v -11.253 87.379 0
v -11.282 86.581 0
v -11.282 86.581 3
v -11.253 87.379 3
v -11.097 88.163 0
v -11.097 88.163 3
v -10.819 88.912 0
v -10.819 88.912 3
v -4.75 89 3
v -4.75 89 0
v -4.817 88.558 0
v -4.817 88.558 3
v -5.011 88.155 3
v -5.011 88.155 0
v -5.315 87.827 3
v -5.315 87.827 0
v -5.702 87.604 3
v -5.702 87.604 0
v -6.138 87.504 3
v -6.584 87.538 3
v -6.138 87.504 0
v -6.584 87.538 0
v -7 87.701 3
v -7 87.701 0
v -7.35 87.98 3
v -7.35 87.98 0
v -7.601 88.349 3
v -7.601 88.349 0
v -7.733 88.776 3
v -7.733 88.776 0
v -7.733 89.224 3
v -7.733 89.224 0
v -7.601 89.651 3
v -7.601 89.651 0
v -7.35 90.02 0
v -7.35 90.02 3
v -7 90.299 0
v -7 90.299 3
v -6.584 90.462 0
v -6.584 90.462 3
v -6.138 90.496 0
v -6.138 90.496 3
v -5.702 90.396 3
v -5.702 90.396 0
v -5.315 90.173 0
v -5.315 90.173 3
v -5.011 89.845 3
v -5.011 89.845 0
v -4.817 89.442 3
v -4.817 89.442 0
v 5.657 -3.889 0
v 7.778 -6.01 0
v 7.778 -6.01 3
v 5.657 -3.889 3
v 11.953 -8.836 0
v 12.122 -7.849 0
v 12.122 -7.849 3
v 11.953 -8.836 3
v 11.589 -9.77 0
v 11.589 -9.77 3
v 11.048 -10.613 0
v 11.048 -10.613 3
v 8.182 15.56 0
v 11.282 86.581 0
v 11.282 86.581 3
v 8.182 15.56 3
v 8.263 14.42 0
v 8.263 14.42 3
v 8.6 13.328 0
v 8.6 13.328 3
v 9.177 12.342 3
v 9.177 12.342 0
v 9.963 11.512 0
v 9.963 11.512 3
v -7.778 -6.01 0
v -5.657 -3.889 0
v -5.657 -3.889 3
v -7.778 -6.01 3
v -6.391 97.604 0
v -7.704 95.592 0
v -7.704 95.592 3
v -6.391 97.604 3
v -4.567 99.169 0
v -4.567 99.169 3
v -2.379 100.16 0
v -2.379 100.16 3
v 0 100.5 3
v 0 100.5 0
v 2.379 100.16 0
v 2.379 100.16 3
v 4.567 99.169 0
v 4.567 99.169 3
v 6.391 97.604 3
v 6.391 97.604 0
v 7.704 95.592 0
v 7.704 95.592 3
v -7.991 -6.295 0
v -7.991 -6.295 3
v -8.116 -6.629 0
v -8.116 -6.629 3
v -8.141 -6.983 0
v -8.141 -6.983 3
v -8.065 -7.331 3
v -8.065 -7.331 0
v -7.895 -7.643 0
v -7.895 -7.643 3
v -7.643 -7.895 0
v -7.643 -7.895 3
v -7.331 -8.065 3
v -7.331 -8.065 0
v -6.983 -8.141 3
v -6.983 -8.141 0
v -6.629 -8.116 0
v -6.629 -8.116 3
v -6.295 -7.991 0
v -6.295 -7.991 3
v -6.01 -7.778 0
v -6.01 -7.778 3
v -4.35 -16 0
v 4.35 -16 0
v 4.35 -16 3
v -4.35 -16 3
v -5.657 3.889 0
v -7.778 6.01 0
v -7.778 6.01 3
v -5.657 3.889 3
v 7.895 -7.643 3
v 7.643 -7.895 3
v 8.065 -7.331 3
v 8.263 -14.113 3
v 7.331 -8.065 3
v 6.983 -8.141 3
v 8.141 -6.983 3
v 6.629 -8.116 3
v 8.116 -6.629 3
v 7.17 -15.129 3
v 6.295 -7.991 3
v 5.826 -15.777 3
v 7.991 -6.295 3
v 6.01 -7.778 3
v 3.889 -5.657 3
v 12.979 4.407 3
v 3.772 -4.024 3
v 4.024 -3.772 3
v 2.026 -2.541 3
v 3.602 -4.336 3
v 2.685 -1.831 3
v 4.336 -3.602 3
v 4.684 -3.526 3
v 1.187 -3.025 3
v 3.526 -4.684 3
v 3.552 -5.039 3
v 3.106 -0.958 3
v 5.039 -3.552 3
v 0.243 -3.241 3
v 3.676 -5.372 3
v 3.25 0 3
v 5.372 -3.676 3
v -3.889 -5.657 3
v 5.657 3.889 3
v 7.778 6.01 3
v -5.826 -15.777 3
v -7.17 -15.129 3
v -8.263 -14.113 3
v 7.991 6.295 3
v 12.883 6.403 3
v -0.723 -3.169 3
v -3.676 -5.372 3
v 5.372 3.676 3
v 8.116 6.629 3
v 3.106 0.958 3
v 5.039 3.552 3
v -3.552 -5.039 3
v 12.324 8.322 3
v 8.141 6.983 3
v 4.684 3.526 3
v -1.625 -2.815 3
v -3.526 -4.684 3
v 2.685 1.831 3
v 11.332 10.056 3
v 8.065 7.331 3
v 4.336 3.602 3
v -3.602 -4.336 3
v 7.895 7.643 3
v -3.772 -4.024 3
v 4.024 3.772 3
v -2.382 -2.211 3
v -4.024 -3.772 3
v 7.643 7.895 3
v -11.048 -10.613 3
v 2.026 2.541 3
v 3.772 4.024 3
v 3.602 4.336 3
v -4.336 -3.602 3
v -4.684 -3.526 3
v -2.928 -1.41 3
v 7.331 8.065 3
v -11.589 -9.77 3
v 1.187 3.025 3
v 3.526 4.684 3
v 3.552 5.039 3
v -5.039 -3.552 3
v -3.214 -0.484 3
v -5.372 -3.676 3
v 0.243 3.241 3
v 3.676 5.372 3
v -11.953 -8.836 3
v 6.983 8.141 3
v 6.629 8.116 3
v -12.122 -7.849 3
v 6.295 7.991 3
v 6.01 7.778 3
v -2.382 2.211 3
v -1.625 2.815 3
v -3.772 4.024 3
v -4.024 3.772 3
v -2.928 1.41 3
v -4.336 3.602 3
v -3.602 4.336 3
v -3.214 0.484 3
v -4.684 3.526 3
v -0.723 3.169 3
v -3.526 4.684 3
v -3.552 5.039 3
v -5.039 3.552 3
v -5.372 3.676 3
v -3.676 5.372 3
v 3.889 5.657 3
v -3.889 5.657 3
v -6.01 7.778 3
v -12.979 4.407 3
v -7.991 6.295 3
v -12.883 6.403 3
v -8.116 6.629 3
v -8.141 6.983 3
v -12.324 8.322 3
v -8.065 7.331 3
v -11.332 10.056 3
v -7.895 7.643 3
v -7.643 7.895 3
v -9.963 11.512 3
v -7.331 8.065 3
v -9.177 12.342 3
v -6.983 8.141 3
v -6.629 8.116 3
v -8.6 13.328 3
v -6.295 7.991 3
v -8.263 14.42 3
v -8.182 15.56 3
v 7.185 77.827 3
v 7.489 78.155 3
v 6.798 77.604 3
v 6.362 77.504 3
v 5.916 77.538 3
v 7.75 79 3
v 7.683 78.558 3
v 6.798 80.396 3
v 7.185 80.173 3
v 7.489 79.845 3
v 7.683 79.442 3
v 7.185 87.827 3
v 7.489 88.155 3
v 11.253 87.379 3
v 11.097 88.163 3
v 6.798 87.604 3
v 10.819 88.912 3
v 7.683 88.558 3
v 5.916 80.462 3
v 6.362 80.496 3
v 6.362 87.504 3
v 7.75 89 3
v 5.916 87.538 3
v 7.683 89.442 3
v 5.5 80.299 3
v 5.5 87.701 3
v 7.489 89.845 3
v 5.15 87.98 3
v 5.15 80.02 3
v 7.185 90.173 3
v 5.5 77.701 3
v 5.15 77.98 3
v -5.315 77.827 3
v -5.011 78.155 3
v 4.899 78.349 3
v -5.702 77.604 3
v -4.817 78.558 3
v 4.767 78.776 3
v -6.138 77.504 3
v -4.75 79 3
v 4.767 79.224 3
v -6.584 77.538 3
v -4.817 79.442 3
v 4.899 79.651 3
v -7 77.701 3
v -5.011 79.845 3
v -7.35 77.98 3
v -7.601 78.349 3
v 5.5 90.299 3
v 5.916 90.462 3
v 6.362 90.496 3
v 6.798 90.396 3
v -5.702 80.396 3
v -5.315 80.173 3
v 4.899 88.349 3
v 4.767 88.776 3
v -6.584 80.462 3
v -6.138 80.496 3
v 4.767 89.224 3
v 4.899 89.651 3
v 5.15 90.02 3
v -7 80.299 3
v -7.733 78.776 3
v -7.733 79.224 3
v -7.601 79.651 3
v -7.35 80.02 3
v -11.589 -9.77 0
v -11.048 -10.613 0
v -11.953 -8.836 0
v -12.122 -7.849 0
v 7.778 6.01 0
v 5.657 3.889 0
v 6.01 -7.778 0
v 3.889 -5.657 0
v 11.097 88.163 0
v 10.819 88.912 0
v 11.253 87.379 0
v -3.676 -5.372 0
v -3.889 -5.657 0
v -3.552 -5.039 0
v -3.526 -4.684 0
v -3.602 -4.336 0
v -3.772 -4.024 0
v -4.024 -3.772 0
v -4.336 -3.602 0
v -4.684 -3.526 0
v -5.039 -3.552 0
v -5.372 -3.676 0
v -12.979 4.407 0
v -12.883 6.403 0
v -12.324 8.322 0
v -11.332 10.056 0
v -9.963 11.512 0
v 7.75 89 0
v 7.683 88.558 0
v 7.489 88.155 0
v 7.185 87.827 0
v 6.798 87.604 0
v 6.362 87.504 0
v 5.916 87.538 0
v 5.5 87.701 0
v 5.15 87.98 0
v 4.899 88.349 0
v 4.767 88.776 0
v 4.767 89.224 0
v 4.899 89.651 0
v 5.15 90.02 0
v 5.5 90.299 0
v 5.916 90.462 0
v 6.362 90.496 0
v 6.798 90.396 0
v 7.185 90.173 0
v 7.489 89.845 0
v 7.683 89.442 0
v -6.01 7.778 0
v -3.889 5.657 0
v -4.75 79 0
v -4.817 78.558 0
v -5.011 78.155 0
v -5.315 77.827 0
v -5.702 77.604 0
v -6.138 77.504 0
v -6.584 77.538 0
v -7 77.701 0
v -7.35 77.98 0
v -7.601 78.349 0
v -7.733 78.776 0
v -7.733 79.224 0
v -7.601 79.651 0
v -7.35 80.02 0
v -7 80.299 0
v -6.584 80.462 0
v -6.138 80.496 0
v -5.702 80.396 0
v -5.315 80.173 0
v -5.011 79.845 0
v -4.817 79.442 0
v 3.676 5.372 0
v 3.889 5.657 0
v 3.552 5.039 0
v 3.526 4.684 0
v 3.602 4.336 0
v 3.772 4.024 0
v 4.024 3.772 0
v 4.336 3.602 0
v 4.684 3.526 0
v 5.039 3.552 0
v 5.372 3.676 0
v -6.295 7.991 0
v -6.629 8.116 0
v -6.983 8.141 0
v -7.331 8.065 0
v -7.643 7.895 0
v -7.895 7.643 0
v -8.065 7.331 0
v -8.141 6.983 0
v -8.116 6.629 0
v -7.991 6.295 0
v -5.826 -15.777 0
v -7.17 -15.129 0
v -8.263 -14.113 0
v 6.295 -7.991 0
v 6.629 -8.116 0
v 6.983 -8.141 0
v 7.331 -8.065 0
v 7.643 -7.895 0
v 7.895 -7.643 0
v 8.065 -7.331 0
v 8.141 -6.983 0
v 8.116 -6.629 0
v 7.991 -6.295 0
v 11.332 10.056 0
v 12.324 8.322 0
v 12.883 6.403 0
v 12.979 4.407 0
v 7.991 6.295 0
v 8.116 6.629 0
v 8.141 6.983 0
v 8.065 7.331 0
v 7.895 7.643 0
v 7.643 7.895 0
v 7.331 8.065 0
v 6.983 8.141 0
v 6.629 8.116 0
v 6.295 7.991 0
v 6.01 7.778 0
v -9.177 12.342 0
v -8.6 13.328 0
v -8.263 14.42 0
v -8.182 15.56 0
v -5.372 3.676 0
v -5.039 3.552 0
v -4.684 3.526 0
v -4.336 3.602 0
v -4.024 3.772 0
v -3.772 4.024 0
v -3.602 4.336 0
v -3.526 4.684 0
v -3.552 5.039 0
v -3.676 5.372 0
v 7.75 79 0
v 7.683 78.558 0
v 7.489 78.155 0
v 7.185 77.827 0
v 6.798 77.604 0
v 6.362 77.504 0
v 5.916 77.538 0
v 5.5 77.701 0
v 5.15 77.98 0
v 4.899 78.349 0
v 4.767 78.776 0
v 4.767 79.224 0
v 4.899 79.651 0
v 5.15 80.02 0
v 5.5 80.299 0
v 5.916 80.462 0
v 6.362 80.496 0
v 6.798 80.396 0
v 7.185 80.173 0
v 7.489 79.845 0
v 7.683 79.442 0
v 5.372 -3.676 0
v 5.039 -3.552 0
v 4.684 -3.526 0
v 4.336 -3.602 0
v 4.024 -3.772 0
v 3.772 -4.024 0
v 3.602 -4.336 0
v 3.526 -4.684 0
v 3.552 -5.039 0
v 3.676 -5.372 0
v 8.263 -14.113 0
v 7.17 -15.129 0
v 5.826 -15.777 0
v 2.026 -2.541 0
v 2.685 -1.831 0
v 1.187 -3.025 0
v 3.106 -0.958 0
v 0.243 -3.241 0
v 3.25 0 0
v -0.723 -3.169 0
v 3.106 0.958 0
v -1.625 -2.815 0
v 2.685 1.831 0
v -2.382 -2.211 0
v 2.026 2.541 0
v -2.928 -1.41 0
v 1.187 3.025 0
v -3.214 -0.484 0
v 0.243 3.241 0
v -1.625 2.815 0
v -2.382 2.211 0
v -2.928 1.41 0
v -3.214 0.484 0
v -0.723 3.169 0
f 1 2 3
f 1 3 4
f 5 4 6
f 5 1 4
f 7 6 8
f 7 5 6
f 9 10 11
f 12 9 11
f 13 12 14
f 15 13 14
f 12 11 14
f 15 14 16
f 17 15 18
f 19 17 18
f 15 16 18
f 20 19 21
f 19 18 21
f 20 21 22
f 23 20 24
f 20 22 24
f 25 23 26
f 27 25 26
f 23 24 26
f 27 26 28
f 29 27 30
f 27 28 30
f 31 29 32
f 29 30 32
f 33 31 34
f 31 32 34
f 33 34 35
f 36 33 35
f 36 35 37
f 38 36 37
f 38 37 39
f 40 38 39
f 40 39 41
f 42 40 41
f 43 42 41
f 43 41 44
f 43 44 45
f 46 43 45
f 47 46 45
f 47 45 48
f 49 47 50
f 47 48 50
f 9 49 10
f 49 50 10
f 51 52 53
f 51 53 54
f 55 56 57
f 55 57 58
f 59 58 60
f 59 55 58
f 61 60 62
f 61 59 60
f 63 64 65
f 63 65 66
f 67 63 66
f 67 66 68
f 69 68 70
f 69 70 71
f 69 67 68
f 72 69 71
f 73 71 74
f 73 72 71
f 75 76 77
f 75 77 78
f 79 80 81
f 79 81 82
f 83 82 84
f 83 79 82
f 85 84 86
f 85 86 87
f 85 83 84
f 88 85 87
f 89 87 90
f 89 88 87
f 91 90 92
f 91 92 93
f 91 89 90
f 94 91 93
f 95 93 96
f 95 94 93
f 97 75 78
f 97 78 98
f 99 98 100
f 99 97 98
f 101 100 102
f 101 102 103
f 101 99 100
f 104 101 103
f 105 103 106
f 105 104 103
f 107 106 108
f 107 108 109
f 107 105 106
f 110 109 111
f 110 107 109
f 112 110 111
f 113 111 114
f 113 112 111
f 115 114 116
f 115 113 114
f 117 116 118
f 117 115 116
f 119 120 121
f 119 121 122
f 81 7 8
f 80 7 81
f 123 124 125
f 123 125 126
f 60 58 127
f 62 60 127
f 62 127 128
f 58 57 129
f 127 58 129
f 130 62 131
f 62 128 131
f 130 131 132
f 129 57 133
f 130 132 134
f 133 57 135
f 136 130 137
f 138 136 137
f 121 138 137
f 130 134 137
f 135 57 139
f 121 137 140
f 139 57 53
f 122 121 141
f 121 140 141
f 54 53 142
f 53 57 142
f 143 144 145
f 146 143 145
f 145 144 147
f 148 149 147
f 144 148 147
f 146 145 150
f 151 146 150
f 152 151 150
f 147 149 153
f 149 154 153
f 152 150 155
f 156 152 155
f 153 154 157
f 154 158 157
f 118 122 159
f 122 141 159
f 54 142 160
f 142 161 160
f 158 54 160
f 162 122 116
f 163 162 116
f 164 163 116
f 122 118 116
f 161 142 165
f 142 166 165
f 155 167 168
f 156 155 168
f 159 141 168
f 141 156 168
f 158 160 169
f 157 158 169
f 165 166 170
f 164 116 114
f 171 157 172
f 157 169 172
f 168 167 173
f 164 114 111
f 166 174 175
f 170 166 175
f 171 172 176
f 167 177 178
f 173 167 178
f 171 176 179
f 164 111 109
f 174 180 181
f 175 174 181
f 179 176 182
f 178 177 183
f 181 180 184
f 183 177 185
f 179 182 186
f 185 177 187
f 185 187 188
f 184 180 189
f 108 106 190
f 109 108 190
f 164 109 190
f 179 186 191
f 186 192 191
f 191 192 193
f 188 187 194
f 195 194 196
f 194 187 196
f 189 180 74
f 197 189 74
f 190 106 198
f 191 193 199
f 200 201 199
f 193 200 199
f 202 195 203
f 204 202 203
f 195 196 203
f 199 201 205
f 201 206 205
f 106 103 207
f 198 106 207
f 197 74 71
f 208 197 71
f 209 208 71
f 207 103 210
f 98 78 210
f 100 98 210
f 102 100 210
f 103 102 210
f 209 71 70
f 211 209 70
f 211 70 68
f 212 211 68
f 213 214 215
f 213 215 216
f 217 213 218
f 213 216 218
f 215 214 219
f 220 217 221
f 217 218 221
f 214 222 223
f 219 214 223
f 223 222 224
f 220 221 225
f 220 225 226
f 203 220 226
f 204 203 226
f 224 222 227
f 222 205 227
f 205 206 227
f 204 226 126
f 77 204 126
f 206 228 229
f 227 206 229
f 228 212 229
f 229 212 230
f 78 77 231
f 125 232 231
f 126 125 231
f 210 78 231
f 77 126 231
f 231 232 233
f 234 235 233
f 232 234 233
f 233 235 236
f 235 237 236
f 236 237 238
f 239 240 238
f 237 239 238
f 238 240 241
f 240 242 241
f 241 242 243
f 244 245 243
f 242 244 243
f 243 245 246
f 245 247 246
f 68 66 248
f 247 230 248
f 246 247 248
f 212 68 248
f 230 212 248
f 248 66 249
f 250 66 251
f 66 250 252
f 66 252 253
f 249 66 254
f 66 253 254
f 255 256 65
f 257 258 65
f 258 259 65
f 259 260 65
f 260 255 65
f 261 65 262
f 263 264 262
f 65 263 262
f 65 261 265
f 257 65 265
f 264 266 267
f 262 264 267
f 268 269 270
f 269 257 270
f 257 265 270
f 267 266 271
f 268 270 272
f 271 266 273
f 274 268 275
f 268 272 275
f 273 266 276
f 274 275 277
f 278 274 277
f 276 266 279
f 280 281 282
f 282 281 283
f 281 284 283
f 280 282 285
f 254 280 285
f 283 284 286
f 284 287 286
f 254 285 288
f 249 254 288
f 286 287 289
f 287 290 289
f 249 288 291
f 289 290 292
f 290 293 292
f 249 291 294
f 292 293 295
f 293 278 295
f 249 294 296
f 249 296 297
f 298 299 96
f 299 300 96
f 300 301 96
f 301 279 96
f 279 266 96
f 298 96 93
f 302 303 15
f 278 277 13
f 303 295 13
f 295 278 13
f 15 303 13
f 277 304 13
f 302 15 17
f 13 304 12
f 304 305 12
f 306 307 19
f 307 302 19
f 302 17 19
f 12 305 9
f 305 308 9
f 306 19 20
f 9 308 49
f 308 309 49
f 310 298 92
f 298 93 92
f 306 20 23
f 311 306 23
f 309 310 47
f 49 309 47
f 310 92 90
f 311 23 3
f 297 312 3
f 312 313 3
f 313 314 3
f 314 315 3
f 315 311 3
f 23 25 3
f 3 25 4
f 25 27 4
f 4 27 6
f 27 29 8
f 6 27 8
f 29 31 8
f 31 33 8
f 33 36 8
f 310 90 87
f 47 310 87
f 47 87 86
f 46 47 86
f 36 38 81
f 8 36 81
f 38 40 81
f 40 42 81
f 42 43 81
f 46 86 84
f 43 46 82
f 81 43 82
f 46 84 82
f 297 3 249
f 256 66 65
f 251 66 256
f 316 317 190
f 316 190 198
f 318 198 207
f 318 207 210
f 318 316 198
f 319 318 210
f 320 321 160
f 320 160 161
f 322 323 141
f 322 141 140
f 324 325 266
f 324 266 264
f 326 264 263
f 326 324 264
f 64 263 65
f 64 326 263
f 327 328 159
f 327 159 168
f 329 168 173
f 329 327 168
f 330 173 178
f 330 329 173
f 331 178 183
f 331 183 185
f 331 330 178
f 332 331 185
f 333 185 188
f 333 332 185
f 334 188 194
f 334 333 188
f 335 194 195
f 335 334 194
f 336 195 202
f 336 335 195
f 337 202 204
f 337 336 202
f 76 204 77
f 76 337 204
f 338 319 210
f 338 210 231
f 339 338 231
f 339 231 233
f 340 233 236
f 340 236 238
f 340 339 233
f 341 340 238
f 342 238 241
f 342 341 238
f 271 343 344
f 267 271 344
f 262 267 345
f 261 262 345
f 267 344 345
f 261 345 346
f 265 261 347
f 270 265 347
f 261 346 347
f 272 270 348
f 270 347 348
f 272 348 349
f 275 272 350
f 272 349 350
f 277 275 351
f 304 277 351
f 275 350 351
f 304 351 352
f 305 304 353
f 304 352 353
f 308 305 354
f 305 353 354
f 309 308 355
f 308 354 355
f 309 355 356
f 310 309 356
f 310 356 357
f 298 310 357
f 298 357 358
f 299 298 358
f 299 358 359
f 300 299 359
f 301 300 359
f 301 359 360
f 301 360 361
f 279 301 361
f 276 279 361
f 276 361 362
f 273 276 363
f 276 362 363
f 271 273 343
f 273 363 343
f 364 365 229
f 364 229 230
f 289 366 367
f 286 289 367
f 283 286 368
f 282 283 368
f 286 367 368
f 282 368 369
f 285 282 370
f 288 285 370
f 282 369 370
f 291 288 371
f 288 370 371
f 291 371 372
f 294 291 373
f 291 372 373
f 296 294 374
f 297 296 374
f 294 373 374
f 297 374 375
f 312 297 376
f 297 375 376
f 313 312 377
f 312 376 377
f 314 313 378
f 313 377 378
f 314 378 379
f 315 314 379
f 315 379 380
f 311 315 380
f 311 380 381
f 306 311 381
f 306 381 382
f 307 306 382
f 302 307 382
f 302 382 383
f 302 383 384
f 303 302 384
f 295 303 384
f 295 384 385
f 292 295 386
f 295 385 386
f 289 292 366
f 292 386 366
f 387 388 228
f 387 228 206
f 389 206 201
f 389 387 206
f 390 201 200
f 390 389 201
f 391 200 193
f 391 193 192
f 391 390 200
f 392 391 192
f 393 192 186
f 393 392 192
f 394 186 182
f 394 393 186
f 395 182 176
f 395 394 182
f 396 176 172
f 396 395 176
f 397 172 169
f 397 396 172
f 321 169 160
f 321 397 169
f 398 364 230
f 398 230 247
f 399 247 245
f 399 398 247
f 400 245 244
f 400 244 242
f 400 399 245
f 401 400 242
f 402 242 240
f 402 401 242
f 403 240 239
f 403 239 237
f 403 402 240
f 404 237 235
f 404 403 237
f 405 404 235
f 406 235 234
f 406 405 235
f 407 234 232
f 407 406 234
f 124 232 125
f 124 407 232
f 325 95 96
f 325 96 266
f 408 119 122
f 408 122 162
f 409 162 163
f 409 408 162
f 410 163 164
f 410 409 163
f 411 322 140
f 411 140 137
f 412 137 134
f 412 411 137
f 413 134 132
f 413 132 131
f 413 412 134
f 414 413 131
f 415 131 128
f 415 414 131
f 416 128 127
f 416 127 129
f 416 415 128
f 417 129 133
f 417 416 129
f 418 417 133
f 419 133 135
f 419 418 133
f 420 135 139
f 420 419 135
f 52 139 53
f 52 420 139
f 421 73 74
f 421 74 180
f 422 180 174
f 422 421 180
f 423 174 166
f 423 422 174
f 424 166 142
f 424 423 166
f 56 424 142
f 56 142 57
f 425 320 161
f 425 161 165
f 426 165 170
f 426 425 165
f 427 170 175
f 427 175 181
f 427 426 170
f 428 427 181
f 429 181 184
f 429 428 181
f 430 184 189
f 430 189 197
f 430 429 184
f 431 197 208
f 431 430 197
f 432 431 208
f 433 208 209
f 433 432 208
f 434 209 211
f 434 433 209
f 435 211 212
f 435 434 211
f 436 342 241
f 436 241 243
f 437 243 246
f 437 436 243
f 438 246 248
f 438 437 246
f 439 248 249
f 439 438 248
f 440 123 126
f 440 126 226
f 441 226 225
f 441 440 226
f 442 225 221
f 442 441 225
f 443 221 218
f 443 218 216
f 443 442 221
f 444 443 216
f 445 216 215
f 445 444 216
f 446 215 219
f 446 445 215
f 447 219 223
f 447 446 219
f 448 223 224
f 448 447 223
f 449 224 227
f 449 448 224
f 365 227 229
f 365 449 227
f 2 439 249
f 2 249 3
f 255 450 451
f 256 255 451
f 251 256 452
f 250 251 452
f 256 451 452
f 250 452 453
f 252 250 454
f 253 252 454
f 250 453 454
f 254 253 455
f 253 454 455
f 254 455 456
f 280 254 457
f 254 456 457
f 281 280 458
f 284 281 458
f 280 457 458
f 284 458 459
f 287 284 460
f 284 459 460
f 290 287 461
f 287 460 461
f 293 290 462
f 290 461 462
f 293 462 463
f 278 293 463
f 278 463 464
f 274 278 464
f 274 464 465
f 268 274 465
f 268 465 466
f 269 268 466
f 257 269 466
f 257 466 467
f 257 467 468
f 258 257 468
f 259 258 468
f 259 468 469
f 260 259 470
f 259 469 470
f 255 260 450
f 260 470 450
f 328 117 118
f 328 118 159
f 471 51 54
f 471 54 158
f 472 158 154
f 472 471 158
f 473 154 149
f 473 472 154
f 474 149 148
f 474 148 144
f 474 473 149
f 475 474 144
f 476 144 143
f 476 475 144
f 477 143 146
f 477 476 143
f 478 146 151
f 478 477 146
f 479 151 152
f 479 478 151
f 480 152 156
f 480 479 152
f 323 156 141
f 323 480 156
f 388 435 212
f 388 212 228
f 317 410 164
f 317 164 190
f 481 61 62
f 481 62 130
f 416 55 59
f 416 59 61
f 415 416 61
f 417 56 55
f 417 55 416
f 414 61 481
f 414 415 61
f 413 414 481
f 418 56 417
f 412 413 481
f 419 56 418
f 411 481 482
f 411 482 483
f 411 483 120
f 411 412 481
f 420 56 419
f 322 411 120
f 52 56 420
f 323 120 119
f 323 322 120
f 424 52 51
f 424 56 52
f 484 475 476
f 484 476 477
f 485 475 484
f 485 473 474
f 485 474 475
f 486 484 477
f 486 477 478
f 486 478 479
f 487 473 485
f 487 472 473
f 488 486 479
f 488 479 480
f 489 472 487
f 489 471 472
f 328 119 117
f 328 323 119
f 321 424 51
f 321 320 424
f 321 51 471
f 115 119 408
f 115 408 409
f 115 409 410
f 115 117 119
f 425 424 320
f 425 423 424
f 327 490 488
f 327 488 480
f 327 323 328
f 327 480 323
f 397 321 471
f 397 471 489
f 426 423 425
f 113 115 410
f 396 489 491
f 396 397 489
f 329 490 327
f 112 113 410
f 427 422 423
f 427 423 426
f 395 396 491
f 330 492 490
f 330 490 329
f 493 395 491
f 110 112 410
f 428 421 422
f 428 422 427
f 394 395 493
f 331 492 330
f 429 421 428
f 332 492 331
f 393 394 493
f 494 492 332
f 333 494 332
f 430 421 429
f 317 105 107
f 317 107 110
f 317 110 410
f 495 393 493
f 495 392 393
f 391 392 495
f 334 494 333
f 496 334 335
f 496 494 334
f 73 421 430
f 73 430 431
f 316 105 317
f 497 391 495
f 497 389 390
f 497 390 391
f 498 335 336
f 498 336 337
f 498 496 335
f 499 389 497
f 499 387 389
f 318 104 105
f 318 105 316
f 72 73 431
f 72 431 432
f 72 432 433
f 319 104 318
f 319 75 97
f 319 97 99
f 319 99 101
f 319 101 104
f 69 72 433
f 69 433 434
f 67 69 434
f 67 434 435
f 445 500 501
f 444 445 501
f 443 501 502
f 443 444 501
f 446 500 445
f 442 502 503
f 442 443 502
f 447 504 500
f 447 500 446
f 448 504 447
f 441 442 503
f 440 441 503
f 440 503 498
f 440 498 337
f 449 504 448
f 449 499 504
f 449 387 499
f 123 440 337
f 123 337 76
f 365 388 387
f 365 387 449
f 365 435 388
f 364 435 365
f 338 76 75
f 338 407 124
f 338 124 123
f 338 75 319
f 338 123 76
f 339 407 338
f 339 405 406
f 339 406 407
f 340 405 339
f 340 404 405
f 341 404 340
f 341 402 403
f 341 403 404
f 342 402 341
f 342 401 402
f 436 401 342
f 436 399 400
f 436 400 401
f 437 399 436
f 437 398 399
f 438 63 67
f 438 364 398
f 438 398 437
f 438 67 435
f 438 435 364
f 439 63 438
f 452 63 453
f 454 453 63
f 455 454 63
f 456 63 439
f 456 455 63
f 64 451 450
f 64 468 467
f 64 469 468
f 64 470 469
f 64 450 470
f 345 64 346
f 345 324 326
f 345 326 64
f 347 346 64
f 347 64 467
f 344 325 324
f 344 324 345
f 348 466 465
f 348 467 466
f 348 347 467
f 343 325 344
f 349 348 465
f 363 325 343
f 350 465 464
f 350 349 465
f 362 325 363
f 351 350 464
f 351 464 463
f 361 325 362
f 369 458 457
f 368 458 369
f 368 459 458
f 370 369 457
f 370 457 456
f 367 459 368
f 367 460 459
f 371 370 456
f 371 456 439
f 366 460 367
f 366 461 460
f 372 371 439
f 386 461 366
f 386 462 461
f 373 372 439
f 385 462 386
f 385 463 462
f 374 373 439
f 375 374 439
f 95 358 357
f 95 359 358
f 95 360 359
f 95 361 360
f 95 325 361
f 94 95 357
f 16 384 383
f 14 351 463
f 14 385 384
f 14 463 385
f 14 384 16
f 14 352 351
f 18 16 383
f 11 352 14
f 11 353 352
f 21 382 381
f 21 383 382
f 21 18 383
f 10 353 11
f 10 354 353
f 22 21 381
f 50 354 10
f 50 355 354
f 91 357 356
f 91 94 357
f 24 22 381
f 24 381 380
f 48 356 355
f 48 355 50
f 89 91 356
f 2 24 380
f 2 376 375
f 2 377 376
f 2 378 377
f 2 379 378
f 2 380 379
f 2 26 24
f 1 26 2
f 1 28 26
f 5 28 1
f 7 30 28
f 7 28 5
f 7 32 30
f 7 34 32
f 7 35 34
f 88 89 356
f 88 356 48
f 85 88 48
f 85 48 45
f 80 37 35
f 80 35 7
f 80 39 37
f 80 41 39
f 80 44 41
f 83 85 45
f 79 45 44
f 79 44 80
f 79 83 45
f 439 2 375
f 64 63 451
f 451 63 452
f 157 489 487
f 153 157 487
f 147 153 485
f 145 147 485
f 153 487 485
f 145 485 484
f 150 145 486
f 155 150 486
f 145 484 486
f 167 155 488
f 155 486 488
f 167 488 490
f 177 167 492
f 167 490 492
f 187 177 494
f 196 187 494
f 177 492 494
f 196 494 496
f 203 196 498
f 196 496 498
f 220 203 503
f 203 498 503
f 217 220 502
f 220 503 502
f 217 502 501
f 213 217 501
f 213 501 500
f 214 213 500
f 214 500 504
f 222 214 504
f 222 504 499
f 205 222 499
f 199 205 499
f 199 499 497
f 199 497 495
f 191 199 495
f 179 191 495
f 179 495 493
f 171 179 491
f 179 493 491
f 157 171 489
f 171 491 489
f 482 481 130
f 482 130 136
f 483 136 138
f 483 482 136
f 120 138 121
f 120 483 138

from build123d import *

# Parameters (mm, degrees)
SKETCH1_R           = 3.25
SKETCH1_R_2         = 1.5
BOSS_EXTRUDE1_DEPTH = 3


with BuildPart() as part:
    # Sketch1 → Boss-Extrude1 (new body)
    with BuildSketch(Plane(origin=(0, 0, 0), x_dir=(-1, 0, 0), z_dir=(0, 0, -1))):
        with BuildLine():
            Line((8.181538342, 15.560412846), (11.282357346, 86.580844321))
            ThreePointArc((11.282357346, 86.580844321), (11.19104264, 87.774392868), (10.818655174, 88.912032567))
            Line((10.818655174, 88.912032567), (7.70361619, 95.592255225))
            ThreePointArc((7.70361619, 95.592255225), (0, 100.5), (-7.70361619, 95.592255225))
            Line((-7.70361619, 95.592255225), (-10.818655174, 88.912032567))
            ThreePointArc((-10.818655174, 88.912032567), (-11.19104264, 87.774392868), (-11.282357346, 86.580844321))
            Line((-11.282357346, 86.580844321), (-8.181538342, 15.560412846))
            ThreePointArc((-8.181538342, 15.560412846), (-8.600305132, 13.328393664), (-9.963157432, 11.511828536))
            ThreePointArc((-9.963157432, 11.511828536), (-12.324154236, 8.321537367), (-12.979294427, 4.407069973))
            Line((-12.979294427, 4.407069973), (-12.122281745, -7.848782369))
            ThreePointArc((-12.122281745, -7.848782369), (-11.79450084, -9.312190191), (-11.047502278, -10.612573183))
            Line((-11.047502278, -10.612573183), (-8.26347657, -14.112573183))
            ThreePointArc((-8.26347657, -14.112573183), (-6.522662073, -15.503491197), (-4.350435786, -16))
            Line((-4.350435786, -16), (4.350435786, -16))
            ThreePointArc((4.350435786, -16), (6.522662073, -15.503491197), (8.26347657, -14.112573183))
            Line((8.26347657, -14.112573183), (11.047502278, -10.612573183))
            ThreePointArc((11.047502278, -10.612573183), (11.79450084, -9.312190191), (12.122281745, -7.848782369))
            Line((12.122281745, -7.848782369), (12.979294427, 4.407069973))
            ThreePointArc((12.979294427, 4.407069973), (12.324154236, 8.321537367), (9.963157432, 11.511828536))
            ThreePointArc((9.963157432, 11.511828536), (8.600305132, 13.328393664), (8.181538342, 15.560412846))
        make_face()
        with Locations(Location((0, 0, 0), (0, 0, 180))):
            Circle(SKETCH1_R, mode=Mode.SUBTRACT)
        with Locations(Location((6.25, 89, 0), (0, 0, 180))):
            Circle(SKETCH1_R_2, mode=Mode.SUBTRACT)
        with Locations(Location((6.25, 79, 0), (0, 0, 180))):
            Circle(SKETCH1_R_2, mode=Mode.SUBTRACT)
        with Locations(Location((-6.25, 89, 0), (0, 0, 180))):
            Circle(SKETCH1_R_2, mode=Mode.SUBTRACT)
        with Locations(Location((-6.25, 79, 0), (0, 0, 180))):
            Circle(SKETCH1_R_2, mode=Mode.SUBTRACT)
        with BuildLine():
            Line((7.778174593, 6.01040764), (5.656854249, 3.889087297))
            ThreePointArc((5.656854249, 3.889087297), (3.889087297, 3.889087297), (3.889087297, 5.656854249))
            Line((3.889087297, 5.656854249), (6.01040764, 7.778174593))
            ThreePointArc((6.01040764, 7.778174593), (7.778174593, 7.778174593), (7.778174593, 6.01040764))
        make_face(mode=Mode.SUBTRACT)
        with BuildLine():
            Line((-5.656854249, 3.889087297), (-7.778174593, 6.01040764))
            ThreePointArc((-7.778174593, 6.01040764), (-7.778174593, 7.778174593), (-6.01040764, 7.778174593))
            Line((-6.01040764, 7.778174593), (-3.889087297, 5.656854249))
            ThreePointArc((-3.889087297, 5.656854249), (-3.889087297, 3.889087297), (-5.656854249, 3.889087297))
        make_face(mode=Mode.SUBTRACT)
        with BuildLine():
            Line((-3.889087297, -5.656854249), (-6.01040764, -7.778174593))
            ThreePointArc((-6.01040764, -7.778174593), (-7.778174593, -7.778174593), (-7.778174593, -6.01040764))
            Line((-7.778174593, -6.01040764), (-5.656854249, -3.889087297))
            ThreePointArc((-5.656854249, -3.889087297), (-3.889087297, -3.889087297), (-3.889087297, -5.656854249))
        make_face(mode=Mode.SUBTRACT)
        with BuildLine():
            Line((6.01040764, -7.778174593), (3.889087297, -5.656854249))
            ThreePointArc((3.889087297, -5.656854249), (3.889087297, -3.889087297), (5.656854249, -3.889087297))
            Line((5.656854249, -3.889087297), (7.778174593, -6.01040764))
            ThreePointArc((7.778174593, -6.01040764), (7.778174593, -7.778174593), (6.01040764, -7.778174593))
        make_face(mode=Mode.SUBTRACT)
    extrude(amount=-BOSS_EXTRUDE1_DEPTH)


solid = part.part
